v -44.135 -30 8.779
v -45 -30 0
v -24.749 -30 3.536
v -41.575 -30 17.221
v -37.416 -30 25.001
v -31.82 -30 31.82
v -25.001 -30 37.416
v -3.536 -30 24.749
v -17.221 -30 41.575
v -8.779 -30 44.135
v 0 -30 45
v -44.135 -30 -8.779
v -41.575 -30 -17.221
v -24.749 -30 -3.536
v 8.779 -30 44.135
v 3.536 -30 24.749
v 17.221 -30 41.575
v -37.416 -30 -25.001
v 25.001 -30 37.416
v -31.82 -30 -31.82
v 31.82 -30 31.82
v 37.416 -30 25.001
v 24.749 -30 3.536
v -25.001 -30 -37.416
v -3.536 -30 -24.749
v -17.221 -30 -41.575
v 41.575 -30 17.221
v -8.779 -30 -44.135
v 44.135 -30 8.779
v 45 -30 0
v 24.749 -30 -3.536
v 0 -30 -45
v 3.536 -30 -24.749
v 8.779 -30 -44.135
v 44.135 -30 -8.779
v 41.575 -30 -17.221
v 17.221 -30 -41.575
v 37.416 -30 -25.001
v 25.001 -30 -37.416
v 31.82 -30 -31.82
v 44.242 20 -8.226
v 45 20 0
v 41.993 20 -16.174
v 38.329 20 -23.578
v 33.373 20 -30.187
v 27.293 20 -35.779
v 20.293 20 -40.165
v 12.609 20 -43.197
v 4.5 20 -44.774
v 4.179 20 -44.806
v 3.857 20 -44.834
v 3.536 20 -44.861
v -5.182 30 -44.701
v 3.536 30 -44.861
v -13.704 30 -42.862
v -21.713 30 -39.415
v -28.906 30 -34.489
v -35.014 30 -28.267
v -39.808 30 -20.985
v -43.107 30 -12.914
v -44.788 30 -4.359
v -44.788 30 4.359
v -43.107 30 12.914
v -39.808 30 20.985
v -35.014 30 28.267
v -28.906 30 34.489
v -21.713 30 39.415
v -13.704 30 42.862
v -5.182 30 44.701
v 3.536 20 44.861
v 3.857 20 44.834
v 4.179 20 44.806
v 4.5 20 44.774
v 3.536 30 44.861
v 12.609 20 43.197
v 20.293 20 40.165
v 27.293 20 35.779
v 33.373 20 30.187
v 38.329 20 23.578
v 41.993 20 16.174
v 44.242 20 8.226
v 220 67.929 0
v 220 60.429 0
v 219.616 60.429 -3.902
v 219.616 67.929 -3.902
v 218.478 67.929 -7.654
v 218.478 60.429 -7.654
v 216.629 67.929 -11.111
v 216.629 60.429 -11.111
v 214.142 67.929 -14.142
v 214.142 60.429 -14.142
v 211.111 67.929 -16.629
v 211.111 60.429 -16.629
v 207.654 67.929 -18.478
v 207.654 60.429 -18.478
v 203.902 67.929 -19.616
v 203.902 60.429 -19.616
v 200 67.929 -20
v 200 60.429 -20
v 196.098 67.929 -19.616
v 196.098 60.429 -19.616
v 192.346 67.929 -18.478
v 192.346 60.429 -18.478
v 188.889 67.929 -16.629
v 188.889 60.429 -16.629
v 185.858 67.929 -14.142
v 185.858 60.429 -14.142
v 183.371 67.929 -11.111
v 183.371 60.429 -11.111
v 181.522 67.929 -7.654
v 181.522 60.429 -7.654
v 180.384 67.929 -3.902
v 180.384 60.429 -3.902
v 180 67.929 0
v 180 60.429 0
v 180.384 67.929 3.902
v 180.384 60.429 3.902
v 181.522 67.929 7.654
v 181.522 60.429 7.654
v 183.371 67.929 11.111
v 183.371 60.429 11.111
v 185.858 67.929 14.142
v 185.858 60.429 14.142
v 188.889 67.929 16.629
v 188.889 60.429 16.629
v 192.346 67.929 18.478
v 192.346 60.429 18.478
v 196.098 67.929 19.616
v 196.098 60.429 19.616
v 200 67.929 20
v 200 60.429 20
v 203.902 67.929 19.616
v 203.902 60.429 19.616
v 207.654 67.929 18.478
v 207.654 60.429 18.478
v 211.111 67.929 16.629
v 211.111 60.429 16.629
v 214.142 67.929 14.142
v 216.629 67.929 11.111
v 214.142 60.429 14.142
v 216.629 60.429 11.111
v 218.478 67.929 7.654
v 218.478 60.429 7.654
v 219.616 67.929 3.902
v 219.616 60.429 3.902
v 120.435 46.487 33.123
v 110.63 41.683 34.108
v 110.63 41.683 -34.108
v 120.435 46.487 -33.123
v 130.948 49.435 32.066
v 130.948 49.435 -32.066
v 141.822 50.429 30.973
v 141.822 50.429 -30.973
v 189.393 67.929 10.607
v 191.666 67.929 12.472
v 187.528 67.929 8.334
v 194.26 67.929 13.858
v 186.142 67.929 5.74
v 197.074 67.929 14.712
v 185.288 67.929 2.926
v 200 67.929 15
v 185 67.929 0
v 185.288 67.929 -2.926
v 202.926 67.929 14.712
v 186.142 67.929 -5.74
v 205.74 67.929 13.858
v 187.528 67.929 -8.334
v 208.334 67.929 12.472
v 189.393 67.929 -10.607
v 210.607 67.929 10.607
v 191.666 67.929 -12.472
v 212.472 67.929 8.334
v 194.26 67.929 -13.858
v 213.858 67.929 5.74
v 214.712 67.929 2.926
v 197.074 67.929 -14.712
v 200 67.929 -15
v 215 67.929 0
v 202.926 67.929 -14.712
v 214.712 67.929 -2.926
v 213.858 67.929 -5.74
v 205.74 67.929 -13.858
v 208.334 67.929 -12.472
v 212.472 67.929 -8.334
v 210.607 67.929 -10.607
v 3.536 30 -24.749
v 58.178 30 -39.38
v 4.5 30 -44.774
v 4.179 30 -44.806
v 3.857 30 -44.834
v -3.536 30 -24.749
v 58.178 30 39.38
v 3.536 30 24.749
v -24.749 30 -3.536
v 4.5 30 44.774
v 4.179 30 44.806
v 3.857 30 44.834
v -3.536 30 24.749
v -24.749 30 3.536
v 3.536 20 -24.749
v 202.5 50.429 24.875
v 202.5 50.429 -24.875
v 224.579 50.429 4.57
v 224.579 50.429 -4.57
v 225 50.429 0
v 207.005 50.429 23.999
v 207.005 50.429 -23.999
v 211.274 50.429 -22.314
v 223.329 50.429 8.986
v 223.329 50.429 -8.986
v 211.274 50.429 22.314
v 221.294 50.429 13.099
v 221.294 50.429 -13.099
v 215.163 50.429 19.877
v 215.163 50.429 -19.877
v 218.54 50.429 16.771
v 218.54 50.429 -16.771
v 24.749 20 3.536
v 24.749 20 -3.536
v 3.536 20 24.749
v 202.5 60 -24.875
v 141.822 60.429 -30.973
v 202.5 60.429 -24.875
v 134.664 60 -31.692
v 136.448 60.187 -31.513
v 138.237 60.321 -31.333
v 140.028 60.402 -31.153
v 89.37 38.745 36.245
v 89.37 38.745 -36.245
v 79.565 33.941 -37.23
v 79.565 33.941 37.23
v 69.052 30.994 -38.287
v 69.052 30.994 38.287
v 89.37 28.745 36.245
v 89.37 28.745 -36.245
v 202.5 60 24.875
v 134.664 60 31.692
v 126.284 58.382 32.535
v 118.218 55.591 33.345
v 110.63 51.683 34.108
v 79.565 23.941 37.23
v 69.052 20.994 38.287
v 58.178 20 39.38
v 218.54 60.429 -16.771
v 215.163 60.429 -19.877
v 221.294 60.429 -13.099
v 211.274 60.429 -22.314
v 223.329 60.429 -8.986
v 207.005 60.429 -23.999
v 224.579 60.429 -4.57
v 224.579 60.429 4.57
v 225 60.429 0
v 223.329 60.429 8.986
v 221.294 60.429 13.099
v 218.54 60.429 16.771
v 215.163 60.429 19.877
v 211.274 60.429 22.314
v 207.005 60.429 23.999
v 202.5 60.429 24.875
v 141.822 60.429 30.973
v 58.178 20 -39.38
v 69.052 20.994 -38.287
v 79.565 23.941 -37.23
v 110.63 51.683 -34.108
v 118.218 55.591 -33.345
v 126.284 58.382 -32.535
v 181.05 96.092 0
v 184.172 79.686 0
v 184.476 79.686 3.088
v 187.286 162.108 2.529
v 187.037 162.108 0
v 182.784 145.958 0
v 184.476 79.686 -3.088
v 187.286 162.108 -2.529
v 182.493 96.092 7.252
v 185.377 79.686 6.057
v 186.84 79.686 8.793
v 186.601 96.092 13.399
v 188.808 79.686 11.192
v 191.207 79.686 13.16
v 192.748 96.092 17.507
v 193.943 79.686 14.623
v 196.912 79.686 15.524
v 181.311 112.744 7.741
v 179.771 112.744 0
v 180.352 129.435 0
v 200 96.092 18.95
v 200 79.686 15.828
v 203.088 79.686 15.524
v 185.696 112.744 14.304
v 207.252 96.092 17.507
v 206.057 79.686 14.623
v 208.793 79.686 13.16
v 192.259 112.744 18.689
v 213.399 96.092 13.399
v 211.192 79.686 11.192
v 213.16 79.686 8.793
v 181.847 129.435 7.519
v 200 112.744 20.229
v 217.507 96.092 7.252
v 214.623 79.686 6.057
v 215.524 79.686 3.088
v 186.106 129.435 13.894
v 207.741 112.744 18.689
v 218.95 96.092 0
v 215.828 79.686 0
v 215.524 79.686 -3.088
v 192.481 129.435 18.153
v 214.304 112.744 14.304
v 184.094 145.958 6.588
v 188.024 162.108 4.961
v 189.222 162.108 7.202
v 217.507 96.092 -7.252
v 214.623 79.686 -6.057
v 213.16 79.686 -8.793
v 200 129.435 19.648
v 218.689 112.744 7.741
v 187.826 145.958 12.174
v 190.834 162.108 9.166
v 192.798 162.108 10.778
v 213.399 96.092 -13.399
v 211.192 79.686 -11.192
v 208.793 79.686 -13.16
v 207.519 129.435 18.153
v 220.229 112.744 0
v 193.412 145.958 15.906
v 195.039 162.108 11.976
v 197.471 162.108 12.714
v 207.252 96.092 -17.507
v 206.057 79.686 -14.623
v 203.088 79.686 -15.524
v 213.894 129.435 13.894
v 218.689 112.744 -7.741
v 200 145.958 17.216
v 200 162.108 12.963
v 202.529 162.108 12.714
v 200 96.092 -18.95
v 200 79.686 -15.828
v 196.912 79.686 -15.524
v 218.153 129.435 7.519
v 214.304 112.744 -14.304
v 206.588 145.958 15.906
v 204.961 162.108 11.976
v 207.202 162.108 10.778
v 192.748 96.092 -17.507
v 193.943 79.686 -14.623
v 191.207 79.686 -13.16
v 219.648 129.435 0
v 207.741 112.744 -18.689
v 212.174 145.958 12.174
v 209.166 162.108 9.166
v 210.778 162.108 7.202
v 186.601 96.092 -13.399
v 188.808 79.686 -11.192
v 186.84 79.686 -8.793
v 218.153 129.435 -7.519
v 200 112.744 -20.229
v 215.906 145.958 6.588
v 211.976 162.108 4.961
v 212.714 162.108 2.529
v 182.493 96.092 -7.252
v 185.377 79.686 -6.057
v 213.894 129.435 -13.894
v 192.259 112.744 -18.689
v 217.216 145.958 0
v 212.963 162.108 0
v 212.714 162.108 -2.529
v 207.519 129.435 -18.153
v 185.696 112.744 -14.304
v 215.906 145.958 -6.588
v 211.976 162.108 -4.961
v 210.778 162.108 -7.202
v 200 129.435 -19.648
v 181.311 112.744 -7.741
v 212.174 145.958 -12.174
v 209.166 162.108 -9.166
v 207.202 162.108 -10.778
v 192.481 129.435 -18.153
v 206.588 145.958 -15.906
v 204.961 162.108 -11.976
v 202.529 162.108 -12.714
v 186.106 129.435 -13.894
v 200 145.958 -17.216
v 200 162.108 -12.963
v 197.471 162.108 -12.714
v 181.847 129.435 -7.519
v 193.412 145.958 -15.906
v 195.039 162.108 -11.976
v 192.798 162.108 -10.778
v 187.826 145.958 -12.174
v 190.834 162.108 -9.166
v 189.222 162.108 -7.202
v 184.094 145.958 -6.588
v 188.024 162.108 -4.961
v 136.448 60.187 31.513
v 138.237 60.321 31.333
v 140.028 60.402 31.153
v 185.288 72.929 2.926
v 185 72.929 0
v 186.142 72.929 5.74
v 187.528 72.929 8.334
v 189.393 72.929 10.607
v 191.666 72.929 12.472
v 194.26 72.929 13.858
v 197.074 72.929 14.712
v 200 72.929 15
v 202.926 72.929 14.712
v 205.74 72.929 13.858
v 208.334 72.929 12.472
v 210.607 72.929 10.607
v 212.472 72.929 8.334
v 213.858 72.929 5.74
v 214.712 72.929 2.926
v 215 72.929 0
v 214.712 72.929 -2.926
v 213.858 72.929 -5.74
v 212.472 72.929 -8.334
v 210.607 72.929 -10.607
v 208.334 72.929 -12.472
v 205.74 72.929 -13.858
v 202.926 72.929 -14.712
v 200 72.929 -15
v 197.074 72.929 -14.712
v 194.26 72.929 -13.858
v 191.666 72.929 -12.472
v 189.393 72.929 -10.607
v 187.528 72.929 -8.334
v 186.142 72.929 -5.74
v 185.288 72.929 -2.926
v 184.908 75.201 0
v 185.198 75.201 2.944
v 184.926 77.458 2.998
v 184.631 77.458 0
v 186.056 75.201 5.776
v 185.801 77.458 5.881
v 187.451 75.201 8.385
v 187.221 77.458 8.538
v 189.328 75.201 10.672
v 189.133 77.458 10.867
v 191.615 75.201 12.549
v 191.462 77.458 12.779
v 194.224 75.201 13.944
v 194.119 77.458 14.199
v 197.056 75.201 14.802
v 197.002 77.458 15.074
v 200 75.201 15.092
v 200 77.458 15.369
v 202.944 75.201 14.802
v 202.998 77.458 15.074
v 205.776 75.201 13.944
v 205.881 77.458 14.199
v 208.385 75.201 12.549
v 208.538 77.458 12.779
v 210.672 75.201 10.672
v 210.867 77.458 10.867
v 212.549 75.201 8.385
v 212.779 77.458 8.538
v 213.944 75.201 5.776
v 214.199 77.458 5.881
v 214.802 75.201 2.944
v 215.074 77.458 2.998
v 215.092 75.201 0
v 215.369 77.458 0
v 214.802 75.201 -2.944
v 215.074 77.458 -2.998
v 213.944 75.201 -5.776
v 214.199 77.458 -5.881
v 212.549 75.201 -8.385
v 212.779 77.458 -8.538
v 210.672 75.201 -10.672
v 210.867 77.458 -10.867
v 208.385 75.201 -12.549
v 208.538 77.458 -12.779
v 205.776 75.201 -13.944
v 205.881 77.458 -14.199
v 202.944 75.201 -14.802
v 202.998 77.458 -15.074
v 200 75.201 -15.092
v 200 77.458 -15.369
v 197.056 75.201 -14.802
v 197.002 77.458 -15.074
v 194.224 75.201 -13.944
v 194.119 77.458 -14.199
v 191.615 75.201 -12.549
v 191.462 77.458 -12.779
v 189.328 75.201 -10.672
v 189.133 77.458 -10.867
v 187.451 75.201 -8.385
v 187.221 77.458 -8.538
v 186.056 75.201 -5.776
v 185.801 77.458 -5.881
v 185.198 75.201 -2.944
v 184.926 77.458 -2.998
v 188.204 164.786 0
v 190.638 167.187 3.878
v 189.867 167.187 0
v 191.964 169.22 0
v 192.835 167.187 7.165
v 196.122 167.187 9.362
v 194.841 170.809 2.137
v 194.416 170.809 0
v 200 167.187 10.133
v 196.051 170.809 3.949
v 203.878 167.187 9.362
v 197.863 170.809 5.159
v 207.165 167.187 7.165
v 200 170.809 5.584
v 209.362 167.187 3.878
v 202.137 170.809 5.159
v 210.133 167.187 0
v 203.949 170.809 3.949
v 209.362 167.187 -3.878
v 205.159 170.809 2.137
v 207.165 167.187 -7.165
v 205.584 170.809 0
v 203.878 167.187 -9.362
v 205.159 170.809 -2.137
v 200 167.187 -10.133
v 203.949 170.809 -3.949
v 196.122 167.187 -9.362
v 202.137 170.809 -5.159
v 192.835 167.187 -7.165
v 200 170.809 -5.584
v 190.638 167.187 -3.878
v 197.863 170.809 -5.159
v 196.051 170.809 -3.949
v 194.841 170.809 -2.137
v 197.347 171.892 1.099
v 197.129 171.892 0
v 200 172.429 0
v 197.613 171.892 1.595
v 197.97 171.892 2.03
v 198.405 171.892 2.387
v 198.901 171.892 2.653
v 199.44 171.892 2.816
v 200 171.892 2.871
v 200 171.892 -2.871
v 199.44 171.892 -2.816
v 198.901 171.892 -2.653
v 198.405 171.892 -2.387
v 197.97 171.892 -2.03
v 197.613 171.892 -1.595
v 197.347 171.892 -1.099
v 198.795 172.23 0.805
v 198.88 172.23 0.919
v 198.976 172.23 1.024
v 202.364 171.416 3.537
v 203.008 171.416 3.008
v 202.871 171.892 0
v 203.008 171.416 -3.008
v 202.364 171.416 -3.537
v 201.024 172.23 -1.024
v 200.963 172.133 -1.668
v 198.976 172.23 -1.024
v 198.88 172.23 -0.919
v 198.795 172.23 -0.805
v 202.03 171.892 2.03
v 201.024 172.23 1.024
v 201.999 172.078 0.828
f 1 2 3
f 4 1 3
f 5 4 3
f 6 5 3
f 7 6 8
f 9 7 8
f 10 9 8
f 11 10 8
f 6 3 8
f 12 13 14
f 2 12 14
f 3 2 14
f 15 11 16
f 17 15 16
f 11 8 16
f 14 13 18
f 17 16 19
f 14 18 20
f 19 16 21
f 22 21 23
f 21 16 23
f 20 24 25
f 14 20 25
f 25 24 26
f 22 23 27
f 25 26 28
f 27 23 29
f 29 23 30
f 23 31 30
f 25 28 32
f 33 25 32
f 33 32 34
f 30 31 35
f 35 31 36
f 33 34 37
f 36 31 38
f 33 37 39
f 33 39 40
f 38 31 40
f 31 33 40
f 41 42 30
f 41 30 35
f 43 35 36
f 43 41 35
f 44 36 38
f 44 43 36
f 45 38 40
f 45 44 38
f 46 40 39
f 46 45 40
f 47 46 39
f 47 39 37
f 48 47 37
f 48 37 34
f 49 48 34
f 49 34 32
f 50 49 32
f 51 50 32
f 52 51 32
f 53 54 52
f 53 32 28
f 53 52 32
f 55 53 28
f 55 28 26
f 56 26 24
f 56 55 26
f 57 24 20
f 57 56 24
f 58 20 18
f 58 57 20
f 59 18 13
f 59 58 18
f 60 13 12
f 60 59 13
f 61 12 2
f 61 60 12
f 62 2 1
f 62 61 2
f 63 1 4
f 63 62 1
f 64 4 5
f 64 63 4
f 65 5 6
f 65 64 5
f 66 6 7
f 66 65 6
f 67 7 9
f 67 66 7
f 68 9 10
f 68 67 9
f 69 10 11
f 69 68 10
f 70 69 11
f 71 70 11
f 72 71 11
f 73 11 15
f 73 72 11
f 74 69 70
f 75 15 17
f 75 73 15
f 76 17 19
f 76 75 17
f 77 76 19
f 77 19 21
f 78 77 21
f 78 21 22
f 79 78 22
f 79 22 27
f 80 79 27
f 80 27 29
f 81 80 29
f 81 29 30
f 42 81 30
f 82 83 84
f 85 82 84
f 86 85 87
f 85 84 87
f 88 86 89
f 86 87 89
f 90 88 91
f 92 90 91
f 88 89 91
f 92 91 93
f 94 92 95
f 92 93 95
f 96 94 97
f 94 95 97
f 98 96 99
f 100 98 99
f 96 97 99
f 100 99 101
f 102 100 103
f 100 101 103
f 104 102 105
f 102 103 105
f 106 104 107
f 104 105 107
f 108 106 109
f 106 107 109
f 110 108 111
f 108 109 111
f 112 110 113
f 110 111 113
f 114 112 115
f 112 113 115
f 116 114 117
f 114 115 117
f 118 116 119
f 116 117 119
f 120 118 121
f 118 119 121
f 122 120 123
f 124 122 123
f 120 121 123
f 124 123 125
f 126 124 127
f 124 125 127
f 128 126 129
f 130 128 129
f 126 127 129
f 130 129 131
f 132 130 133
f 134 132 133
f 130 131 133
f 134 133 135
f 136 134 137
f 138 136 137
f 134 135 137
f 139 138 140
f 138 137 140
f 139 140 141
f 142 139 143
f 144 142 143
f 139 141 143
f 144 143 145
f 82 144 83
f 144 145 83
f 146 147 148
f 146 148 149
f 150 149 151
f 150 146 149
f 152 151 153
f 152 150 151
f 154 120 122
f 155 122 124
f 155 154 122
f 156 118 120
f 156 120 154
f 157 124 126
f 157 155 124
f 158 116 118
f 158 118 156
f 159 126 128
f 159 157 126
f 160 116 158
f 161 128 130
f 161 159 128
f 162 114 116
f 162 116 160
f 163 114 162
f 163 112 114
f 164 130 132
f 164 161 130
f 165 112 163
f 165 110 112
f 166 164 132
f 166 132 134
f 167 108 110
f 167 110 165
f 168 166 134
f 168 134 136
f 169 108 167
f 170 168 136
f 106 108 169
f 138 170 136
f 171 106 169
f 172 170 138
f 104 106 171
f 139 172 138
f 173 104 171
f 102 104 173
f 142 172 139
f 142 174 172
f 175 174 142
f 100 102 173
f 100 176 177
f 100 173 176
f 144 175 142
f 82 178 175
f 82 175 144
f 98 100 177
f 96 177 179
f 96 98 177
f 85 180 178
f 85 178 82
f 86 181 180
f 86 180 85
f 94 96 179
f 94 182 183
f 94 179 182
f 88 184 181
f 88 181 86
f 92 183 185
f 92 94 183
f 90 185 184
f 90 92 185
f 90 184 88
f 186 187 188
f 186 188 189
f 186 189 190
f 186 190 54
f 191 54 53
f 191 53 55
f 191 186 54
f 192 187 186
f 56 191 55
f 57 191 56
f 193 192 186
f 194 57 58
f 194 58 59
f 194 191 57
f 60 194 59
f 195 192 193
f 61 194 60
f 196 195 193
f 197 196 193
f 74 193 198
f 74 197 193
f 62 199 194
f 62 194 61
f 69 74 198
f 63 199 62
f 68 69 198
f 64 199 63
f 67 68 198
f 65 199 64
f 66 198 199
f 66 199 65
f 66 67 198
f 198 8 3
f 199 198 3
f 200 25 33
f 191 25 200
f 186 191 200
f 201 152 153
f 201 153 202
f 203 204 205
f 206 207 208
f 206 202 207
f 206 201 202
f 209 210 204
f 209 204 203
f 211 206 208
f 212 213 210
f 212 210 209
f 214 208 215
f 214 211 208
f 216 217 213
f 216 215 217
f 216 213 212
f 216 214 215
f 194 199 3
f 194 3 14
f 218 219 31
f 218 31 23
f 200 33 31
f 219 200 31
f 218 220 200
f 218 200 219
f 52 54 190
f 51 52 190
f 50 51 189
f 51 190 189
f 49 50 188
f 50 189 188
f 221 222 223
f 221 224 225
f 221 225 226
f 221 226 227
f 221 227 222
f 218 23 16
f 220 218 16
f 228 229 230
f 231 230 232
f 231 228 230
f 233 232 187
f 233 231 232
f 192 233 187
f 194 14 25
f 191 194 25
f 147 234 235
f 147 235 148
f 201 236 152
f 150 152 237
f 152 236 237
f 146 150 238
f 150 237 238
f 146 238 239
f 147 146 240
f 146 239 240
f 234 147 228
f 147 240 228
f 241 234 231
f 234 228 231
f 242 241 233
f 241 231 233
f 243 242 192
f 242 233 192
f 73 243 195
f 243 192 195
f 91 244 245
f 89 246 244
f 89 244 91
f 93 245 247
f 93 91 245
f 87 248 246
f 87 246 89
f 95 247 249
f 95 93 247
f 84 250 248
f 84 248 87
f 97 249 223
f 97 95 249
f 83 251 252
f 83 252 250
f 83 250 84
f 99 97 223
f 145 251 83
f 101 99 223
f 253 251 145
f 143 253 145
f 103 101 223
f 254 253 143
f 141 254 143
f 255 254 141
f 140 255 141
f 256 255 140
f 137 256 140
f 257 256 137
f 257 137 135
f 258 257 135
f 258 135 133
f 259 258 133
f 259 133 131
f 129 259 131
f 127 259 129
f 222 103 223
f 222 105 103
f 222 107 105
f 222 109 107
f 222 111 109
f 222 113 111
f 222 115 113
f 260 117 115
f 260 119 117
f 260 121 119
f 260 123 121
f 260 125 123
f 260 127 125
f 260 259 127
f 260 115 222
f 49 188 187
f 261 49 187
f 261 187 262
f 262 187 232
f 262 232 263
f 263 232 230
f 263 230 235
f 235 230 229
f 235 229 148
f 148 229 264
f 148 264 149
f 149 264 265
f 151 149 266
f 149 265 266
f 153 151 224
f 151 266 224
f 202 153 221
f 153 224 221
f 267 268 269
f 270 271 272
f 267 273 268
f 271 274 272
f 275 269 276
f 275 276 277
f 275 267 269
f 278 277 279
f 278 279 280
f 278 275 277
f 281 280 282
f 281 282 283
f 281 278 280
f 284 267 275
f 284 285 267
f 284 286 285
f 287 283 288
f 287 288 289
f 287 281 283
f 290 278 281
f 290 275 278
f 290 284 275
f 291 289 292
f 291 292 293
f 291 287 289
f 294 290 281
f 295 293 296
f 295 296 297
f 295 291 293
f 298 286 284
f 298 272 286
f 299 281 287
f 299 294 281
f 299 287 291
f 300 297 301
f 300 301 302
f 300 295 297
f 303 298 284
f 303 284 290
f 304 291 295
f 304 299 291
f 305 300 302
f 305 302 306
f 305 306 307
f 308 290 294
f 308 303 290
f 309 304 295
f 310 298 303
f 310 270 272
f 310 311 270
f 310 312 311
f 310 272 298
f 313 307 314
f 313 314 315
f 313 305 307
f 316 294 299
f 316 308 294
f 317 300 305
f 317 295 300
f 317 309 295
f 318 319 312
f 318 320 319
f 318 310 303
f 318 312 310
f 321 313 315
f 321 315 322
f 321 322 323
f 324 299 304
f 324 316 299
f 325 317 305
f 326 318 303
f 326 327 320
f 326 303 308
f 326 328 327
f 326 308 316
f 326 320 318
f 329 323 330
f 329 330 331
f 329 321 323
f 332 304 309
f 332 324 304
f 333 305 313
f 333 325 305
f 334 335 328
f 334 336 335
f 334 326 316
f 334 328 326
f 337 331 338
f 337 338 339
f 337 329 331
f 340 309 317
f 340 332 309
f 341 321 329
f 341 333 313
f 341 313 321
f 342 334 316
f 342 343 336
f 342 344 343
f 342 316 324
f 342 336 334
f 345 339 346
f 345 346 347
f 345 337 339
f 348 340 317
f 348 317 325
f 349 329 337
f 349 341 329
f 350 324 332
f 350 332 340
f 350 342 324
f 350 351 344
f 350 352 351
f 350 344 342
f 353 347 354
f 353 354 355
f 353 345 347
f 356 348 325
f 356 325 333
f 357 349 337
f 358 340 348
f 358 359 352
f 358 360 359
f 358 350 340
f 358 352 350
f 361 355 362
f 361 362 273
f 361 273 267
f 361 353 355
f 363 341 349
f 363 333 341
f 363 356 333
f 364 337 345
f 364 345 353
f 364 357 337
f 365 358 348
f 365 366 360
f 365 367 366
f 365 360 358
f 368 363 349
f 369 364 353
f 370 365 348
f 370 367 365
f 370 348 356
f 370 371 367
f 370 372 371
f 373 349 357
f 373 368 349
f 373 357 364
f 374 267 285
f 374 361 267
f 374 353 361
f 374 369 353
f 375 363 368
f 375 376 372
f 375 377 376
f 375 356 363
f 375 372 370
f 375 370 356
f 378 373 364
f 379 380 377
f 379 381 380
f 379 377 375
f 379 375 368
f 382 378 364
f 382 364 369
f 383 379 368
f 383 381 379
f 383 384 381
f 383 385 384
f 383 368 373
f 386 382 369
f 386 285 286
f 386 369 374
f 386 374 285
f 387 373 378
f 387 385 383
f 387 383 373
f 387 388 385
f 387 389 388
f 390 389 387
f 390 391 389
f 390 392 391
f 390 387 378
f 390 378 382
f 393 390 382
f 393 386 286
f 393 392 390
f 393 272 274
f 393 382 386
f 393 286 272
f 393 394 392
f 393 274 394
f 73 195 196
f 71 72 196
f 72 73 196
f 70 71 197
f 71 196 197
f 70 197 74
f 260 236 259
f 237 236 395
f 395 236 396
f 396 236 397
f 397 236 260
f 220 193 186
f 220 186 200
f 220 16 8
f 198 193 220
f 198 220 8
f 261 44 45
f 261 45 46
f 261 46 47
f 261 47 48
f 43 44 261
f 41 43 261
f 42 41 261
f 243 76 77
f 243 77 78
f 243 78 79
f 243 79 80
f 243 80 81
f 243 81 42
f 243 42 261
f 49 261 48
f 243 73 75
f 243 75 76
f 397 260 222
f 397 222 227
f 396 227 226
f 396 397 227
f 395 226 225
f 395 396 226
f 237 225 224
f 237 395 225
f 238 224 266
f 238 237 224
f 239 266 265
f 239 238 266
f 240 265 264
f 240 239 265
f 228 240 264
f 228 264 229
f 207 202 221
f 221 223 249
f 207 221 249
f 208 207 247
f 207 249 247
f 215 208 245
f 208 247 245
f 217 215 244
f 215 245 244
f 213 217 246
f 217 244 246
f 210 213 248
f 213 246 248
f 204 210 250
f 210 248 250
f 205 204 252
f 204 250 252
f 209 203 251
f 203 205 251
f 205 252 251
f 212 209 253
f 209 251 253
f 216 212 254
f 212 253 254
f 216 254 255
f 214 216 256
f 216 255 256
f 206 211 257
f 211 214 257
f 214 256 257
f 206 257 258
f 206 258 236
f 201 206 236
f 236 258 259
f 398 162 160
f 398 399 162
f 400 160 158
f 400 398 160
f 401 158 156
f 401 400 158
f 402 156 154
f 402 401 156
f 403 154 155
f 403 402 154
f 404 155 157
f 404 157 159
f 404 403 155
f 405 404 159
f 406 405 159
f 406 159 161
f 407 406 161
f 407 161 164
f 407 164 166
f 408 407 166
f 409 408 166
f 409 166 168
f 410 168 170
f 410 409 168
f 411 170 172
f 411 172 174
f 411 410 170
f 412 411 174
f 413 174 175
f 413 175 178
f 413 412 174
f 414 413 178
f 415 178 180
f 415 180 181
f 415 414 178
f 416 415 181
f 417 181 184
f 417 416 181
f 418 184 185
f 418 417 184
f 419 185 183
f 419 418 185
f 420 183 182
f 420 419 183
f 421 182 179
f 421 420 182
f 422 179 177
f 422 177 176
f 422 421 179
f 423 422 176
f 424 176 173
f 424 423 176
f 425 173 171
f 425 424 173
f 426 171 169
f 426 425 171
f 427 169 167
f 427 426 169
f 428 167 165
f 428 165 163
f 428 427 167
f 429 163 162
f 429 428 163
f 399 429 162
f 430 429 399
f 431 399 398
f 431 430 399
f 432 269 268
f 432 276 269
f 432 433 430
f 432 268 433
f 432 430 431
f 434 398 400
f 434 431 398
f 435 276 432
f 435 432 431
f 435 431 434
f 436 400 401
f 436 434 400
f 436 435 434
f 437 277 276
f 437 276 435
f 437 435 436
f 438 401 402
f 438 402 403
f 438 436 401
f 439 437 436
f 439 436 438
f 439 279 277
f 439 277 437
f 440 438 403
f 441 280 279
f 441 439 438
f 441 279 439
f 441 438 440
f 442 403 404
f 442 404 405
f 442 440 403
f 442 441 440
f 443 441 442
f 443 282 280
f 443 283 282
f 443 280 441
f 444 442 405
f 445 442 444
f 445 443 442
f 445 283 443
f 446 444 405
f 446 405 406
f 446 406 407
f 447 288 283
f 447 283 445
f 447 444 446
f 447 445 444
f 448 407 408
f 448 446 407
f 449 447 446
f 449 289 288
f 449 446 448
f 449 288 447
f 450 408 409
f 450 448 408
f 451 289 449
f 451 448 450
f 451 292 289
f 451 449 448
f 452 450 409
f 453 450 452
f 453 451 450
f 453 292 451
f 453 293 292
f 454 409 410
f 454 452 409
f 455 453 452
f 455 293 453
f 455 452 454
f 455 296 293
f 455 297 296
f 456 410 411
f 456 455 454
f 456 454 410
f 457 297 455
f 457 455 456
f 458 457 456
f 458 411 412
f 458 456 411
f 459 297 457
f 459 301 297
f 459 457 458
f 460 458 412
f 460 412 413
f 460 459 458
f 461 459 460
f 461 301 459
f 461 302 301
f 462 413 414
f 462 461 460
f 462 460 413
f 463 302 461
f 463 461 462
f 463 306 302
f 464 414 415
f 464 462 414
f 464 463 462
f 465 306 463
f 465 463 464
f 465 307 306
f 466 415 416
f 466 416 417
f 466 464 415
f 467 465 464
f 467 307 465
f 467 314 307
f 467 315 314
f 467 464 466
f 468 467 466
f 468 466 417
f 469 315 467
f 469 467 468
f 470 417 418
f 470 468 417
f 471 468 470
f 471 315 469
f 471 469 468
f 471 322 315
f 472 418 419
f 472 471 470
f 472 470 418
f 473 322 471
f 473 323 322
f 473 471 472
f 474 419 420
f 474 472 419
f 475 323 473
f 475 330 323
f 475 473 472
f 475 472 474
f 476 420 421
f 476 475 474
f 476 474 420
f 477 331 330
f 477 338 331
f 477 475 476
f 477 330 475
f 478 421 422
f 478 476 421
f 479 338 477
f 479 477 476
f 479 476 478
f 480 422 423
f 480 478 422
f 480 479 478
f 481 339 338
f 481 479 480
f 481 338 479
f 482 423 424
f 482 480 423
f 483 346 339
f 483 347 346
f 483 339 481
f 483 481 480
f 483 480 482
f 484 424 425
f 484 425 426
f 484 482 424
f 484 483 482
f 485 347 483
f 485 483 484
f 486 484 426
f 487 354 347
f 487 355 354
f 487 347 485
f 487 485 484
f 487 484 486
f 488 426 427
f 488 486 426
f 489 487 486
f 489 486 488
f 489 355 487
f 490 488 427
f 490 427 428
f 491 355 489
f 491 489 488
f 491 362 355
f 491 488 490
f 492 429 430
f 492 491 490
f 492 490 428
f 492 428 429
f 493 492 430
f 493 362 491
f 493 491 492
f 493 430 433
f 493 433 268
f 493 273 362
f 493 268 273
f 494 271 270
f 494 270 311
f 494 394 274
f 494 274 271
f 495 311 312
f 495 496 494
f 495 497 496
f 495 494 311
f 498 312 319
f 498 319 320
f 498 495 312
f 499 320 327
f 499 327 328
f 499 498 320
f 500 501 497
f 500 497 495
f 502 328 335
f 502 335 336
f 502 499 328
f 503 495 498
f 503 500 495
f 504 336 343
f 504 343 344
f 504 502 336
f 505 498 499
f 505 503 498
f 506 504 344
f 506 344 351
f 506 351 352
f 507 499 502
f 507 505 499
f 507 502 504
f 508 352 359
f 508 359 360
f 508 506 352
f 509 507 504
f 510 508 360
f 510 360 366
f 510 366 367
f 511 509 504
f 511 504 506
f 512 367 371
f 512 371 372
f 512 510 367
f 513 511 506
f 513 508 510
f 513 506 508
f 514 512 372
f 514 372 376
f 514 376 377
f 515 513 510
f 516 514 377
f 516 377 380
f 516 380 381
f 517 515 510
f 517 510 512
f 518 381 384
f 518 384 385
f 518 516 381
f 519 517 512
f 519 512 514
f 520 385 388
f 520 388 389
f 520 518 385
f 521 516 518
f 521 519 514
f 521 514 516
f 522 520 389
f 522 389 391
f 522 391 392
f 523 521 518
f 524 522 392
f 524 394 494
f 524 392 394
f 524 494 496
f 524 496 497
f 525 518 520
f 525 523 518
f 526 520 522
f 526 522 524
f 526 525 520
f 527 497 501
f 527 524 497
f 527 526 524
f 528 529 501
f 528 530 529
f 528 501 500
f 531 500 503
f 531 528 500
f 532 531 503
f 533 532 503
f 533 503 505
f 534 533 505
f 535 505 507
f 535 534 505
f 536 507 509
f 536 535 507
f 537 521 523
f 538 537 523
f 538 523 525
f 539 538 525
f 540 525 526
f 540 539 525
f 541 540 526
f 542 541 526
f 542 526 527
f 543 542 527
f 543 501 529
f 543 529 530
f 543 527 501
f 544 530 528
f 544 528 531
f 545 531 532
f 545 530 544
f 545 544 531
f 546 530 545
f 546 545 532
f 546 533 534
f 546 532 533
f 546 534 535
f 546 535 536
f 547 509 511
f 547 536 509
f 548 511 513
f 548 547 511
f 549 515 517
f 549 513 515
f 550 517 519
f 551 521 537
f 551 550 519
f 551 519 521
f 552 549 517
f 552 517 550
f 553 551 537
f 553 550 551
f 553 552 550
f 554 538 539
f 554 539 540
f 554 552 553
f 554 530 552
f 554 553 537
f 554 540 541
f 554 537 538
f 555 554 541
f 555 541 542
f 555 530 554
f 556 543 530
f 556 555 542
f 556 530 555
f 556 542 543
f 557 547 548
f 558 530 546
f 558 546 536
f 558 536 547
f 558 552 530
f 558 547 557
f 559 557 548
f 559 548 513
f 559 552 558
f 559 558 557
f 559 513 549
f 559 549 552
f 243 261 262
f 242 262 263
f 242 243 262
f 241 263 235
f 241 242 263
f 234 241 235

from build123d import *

# Parameters (mm, degrees)
IZIM2_R                     = 45
Y_KSEKLIK_EKSTR_ZYON1_DEPTH = 30
KES_EKSTR_ZYON1_DEPTH       = 61
Y_KSEKLIK_EKSTR_ZYON2_DEPTH = 45
KES_EKSTR_ZYON2_DEPTH       = 91
KES_EKSTR_ZYON4_DEPTH       = 1.428514546
IZIM10_R                    = 20
Y_KSEKLIK_EKSTR_ZYON3_DEPTH = 7.5


with BuildPart() as part:
    # Çizim2 → Yükseklik-Ekstrüzyon1 (new body, symmetric)
    with BuildSketch(Plane(origin=(0, 0, 0), x_dir=(1, 0, 0), z_dir=(0, 1, 0))):
        Circle(IZIM2_R)
    extrude(amount=Y_KSEKLIK_EKSTR_ZYON1_DEPTH, both=True)

    # Çizim3 → Kes-Ekstrüzyon1 (cut, through all)
    with BuildSketch(Plane(origin=(0, 30, 0), x_dir=(1, 0, 0), z_dir=(0, 1, 0))):
        Polygon((-24.748737342, 3.535533906), (-3.535533906, 24.748737342), (3.535533906, 24.748737342), (24.748737342, 3.535533906), (24.748737342, -3.535533906), (3.535533906, -24.748737342), (-3.535533906, -24.748737342), (-24.748737342, -3.535533906), align=None)
    extrude(amount=-KES_EKSTR_ZYON1_DEPTH, mode=Mode.SUBTRACT)

    # Çizim4 → Yükseklik-Ekstrüzyon2 (add, symmetric)
    with BuildSketch(Plane.XY):
        with BuildLine():
            Line((3.535533906, 30), (3.535533906, 20))
            Line((3.535533906, 20), (58.177999867, 20))
            ThreePointArc((58.177999867, 20), (74.375437748, 22.227662276), (89.370128252, 28.745233131))
            Line((89.370128252, 28.745233131), (110.629871748, 41.683281415))
            ThreePointArc((110.629871748, 41.683281415), (125.624562252, 48.20085227), (141.822000133, 50.428514546))
            Line((141.822000133, 50.428514546), (200, 50.428514546))
            Line((200, 50.428514546), (225, 50.428514546))
            Line((225, 50.428514546), (225, 60.428514546))
            Line((225, 60.428514546), (200, 60.428514546))
            Line((200, 60.428514546), (141.822000133, 60.428514546))
            ThreePointArc((141.822000133, 60.428514546), (125.624562252, 58.20085227), (110.629871748, 51.683281415))
            Line((110.629871748, 51.683281415), (89.370128252, 38.745233131))
            ThreePointArc((89.370128252, 38.745233131), (74.375437748, 32.227662276), (58.177999867, 30))
            Line((58.177999867, 30), (3.535533906, 30))
        make_face()
    extrude(amount=Y_KSEKLIK_EKSTR_ZYON2_DEPTH, both=True)

    # Çizim8 → Kes-Ekstrüzyon2 (cut, through all)
    with BuildSketch(Plane(origin=(0, 60, 0), x_dir=(1, 0, 0), z_dir=(0, 1, 0))):
        with BuildLine():
            ThreePointArc((3.535533906, 44.860896112), (4.017999525, 44.820259703), (4.5, 44.77443467))
            Line((4.5, 44.77443467), (202.5, 24.874685928))
            ThreePointArc((202.5, 24.874685928), (218.540496218, 16.770509831), (225, 0))
            Line((225, 0), (225, 45))
            Line((225, 45), (3.535533906, 45))
            Line((3.535533906, 45), (3.535533906, 44.860896112))
        make_face()
        with BuildLine():
            Line((225, -45), (225, 0))
            ThreePointArc((225, 0), (218.540496218, -16.770509831), (202.5, -24.874685928))
            Line((202.5, -24.874685928), (4.5, -44.77443467))
            ThreePointArc((4.5, -44.77443467), (4.017999525, -44.820259703), (3.535533906, -44.860896112))
            Line((3.535533906, -44.860896112), (3.535533906, -45))
            Line((3.535533906, -45), (225, -45))
        make_face()
    extrude(amount=-KES_EKSTR_ZYON2_DEPTH, mode=Mode.SUBTRACT)

    # Çizim9 → Kes-Ekstrüzyon4 (cut, through all)
    with BuildSketch(Plane(origin=(0, 60, 0), x_dir=(1, 0, 0), z_dir=(0, 1, 0))):
        with BuildLine():
            Line((134.663919329, 31.692468559), (202.5, 24.874685928))
            ThreePointArc((202.5, 24.874685928), (218.540496218, 16.770509831), (225, 0))
            Line((225, 0), (225, 45))
            Line((225, 45), (134.663919329, 45))
            Line((134.663919329, 45), (134.663919329, 31.692468559))
        make_face()
        with BuildLine():
            Line((202.5, -24.874685928), (134.663919329, -31.692468559))
            Line((134.663919329, -31.692468559), (134.663919329, -45))
            Line((134.663919329, -45), (225, -45))
            Line((225, -45), (225, 0))
            ThreePointArc((225, 0), (218.540496218, -16.770509831), (202.5, -24.874685928))
        make_face()
    extrude(amount=KES_EKSTR_ZYON4_DEPTH, mode=Mode.SUBTRACT)

    # Çizim10 → Yükseklik-Ekstrüzyon3 (add)
    with BuildSketch(Plane(origin=(0, 60.428514546, 0), x_dir=(1, 0, 0), z_dir=(0, 1, 0))):
        with Locations((200, 0)):
            Circle(IZIM10_R)
    extrude(amount=Y_KSEKLIK_EKSTR_ZYON3_DEPTH)

    # Çizim12 → Döndür1 (revolve)
    with BuildSketch(Plane.XY):
        with BuildLine():
            Line((185, 67.928514546), (185, 72.928514546))
            ThreePointArc((185, 72.928514546), (184.792317085, 76.332499126), (184.172349213, 79.685987317))
            ThreePointArc((184.172349213, 79.685987317), (179.829043862, 121.097612219), (187.037341752, 162.107701465))
            ThreePointArc((187.037341752, 162.107701465), (191.964278666, 169.220382002), (200, 172.428514546))
            Line((200, 172.428514546), (200, 67.928514546))
            Line((200, 67.928514546), (185, 67.928514546))
        make_face()
    revolve(axis=Axis((200, 67.928514546, 0), (0, 1, 0)))


solid = part.part
